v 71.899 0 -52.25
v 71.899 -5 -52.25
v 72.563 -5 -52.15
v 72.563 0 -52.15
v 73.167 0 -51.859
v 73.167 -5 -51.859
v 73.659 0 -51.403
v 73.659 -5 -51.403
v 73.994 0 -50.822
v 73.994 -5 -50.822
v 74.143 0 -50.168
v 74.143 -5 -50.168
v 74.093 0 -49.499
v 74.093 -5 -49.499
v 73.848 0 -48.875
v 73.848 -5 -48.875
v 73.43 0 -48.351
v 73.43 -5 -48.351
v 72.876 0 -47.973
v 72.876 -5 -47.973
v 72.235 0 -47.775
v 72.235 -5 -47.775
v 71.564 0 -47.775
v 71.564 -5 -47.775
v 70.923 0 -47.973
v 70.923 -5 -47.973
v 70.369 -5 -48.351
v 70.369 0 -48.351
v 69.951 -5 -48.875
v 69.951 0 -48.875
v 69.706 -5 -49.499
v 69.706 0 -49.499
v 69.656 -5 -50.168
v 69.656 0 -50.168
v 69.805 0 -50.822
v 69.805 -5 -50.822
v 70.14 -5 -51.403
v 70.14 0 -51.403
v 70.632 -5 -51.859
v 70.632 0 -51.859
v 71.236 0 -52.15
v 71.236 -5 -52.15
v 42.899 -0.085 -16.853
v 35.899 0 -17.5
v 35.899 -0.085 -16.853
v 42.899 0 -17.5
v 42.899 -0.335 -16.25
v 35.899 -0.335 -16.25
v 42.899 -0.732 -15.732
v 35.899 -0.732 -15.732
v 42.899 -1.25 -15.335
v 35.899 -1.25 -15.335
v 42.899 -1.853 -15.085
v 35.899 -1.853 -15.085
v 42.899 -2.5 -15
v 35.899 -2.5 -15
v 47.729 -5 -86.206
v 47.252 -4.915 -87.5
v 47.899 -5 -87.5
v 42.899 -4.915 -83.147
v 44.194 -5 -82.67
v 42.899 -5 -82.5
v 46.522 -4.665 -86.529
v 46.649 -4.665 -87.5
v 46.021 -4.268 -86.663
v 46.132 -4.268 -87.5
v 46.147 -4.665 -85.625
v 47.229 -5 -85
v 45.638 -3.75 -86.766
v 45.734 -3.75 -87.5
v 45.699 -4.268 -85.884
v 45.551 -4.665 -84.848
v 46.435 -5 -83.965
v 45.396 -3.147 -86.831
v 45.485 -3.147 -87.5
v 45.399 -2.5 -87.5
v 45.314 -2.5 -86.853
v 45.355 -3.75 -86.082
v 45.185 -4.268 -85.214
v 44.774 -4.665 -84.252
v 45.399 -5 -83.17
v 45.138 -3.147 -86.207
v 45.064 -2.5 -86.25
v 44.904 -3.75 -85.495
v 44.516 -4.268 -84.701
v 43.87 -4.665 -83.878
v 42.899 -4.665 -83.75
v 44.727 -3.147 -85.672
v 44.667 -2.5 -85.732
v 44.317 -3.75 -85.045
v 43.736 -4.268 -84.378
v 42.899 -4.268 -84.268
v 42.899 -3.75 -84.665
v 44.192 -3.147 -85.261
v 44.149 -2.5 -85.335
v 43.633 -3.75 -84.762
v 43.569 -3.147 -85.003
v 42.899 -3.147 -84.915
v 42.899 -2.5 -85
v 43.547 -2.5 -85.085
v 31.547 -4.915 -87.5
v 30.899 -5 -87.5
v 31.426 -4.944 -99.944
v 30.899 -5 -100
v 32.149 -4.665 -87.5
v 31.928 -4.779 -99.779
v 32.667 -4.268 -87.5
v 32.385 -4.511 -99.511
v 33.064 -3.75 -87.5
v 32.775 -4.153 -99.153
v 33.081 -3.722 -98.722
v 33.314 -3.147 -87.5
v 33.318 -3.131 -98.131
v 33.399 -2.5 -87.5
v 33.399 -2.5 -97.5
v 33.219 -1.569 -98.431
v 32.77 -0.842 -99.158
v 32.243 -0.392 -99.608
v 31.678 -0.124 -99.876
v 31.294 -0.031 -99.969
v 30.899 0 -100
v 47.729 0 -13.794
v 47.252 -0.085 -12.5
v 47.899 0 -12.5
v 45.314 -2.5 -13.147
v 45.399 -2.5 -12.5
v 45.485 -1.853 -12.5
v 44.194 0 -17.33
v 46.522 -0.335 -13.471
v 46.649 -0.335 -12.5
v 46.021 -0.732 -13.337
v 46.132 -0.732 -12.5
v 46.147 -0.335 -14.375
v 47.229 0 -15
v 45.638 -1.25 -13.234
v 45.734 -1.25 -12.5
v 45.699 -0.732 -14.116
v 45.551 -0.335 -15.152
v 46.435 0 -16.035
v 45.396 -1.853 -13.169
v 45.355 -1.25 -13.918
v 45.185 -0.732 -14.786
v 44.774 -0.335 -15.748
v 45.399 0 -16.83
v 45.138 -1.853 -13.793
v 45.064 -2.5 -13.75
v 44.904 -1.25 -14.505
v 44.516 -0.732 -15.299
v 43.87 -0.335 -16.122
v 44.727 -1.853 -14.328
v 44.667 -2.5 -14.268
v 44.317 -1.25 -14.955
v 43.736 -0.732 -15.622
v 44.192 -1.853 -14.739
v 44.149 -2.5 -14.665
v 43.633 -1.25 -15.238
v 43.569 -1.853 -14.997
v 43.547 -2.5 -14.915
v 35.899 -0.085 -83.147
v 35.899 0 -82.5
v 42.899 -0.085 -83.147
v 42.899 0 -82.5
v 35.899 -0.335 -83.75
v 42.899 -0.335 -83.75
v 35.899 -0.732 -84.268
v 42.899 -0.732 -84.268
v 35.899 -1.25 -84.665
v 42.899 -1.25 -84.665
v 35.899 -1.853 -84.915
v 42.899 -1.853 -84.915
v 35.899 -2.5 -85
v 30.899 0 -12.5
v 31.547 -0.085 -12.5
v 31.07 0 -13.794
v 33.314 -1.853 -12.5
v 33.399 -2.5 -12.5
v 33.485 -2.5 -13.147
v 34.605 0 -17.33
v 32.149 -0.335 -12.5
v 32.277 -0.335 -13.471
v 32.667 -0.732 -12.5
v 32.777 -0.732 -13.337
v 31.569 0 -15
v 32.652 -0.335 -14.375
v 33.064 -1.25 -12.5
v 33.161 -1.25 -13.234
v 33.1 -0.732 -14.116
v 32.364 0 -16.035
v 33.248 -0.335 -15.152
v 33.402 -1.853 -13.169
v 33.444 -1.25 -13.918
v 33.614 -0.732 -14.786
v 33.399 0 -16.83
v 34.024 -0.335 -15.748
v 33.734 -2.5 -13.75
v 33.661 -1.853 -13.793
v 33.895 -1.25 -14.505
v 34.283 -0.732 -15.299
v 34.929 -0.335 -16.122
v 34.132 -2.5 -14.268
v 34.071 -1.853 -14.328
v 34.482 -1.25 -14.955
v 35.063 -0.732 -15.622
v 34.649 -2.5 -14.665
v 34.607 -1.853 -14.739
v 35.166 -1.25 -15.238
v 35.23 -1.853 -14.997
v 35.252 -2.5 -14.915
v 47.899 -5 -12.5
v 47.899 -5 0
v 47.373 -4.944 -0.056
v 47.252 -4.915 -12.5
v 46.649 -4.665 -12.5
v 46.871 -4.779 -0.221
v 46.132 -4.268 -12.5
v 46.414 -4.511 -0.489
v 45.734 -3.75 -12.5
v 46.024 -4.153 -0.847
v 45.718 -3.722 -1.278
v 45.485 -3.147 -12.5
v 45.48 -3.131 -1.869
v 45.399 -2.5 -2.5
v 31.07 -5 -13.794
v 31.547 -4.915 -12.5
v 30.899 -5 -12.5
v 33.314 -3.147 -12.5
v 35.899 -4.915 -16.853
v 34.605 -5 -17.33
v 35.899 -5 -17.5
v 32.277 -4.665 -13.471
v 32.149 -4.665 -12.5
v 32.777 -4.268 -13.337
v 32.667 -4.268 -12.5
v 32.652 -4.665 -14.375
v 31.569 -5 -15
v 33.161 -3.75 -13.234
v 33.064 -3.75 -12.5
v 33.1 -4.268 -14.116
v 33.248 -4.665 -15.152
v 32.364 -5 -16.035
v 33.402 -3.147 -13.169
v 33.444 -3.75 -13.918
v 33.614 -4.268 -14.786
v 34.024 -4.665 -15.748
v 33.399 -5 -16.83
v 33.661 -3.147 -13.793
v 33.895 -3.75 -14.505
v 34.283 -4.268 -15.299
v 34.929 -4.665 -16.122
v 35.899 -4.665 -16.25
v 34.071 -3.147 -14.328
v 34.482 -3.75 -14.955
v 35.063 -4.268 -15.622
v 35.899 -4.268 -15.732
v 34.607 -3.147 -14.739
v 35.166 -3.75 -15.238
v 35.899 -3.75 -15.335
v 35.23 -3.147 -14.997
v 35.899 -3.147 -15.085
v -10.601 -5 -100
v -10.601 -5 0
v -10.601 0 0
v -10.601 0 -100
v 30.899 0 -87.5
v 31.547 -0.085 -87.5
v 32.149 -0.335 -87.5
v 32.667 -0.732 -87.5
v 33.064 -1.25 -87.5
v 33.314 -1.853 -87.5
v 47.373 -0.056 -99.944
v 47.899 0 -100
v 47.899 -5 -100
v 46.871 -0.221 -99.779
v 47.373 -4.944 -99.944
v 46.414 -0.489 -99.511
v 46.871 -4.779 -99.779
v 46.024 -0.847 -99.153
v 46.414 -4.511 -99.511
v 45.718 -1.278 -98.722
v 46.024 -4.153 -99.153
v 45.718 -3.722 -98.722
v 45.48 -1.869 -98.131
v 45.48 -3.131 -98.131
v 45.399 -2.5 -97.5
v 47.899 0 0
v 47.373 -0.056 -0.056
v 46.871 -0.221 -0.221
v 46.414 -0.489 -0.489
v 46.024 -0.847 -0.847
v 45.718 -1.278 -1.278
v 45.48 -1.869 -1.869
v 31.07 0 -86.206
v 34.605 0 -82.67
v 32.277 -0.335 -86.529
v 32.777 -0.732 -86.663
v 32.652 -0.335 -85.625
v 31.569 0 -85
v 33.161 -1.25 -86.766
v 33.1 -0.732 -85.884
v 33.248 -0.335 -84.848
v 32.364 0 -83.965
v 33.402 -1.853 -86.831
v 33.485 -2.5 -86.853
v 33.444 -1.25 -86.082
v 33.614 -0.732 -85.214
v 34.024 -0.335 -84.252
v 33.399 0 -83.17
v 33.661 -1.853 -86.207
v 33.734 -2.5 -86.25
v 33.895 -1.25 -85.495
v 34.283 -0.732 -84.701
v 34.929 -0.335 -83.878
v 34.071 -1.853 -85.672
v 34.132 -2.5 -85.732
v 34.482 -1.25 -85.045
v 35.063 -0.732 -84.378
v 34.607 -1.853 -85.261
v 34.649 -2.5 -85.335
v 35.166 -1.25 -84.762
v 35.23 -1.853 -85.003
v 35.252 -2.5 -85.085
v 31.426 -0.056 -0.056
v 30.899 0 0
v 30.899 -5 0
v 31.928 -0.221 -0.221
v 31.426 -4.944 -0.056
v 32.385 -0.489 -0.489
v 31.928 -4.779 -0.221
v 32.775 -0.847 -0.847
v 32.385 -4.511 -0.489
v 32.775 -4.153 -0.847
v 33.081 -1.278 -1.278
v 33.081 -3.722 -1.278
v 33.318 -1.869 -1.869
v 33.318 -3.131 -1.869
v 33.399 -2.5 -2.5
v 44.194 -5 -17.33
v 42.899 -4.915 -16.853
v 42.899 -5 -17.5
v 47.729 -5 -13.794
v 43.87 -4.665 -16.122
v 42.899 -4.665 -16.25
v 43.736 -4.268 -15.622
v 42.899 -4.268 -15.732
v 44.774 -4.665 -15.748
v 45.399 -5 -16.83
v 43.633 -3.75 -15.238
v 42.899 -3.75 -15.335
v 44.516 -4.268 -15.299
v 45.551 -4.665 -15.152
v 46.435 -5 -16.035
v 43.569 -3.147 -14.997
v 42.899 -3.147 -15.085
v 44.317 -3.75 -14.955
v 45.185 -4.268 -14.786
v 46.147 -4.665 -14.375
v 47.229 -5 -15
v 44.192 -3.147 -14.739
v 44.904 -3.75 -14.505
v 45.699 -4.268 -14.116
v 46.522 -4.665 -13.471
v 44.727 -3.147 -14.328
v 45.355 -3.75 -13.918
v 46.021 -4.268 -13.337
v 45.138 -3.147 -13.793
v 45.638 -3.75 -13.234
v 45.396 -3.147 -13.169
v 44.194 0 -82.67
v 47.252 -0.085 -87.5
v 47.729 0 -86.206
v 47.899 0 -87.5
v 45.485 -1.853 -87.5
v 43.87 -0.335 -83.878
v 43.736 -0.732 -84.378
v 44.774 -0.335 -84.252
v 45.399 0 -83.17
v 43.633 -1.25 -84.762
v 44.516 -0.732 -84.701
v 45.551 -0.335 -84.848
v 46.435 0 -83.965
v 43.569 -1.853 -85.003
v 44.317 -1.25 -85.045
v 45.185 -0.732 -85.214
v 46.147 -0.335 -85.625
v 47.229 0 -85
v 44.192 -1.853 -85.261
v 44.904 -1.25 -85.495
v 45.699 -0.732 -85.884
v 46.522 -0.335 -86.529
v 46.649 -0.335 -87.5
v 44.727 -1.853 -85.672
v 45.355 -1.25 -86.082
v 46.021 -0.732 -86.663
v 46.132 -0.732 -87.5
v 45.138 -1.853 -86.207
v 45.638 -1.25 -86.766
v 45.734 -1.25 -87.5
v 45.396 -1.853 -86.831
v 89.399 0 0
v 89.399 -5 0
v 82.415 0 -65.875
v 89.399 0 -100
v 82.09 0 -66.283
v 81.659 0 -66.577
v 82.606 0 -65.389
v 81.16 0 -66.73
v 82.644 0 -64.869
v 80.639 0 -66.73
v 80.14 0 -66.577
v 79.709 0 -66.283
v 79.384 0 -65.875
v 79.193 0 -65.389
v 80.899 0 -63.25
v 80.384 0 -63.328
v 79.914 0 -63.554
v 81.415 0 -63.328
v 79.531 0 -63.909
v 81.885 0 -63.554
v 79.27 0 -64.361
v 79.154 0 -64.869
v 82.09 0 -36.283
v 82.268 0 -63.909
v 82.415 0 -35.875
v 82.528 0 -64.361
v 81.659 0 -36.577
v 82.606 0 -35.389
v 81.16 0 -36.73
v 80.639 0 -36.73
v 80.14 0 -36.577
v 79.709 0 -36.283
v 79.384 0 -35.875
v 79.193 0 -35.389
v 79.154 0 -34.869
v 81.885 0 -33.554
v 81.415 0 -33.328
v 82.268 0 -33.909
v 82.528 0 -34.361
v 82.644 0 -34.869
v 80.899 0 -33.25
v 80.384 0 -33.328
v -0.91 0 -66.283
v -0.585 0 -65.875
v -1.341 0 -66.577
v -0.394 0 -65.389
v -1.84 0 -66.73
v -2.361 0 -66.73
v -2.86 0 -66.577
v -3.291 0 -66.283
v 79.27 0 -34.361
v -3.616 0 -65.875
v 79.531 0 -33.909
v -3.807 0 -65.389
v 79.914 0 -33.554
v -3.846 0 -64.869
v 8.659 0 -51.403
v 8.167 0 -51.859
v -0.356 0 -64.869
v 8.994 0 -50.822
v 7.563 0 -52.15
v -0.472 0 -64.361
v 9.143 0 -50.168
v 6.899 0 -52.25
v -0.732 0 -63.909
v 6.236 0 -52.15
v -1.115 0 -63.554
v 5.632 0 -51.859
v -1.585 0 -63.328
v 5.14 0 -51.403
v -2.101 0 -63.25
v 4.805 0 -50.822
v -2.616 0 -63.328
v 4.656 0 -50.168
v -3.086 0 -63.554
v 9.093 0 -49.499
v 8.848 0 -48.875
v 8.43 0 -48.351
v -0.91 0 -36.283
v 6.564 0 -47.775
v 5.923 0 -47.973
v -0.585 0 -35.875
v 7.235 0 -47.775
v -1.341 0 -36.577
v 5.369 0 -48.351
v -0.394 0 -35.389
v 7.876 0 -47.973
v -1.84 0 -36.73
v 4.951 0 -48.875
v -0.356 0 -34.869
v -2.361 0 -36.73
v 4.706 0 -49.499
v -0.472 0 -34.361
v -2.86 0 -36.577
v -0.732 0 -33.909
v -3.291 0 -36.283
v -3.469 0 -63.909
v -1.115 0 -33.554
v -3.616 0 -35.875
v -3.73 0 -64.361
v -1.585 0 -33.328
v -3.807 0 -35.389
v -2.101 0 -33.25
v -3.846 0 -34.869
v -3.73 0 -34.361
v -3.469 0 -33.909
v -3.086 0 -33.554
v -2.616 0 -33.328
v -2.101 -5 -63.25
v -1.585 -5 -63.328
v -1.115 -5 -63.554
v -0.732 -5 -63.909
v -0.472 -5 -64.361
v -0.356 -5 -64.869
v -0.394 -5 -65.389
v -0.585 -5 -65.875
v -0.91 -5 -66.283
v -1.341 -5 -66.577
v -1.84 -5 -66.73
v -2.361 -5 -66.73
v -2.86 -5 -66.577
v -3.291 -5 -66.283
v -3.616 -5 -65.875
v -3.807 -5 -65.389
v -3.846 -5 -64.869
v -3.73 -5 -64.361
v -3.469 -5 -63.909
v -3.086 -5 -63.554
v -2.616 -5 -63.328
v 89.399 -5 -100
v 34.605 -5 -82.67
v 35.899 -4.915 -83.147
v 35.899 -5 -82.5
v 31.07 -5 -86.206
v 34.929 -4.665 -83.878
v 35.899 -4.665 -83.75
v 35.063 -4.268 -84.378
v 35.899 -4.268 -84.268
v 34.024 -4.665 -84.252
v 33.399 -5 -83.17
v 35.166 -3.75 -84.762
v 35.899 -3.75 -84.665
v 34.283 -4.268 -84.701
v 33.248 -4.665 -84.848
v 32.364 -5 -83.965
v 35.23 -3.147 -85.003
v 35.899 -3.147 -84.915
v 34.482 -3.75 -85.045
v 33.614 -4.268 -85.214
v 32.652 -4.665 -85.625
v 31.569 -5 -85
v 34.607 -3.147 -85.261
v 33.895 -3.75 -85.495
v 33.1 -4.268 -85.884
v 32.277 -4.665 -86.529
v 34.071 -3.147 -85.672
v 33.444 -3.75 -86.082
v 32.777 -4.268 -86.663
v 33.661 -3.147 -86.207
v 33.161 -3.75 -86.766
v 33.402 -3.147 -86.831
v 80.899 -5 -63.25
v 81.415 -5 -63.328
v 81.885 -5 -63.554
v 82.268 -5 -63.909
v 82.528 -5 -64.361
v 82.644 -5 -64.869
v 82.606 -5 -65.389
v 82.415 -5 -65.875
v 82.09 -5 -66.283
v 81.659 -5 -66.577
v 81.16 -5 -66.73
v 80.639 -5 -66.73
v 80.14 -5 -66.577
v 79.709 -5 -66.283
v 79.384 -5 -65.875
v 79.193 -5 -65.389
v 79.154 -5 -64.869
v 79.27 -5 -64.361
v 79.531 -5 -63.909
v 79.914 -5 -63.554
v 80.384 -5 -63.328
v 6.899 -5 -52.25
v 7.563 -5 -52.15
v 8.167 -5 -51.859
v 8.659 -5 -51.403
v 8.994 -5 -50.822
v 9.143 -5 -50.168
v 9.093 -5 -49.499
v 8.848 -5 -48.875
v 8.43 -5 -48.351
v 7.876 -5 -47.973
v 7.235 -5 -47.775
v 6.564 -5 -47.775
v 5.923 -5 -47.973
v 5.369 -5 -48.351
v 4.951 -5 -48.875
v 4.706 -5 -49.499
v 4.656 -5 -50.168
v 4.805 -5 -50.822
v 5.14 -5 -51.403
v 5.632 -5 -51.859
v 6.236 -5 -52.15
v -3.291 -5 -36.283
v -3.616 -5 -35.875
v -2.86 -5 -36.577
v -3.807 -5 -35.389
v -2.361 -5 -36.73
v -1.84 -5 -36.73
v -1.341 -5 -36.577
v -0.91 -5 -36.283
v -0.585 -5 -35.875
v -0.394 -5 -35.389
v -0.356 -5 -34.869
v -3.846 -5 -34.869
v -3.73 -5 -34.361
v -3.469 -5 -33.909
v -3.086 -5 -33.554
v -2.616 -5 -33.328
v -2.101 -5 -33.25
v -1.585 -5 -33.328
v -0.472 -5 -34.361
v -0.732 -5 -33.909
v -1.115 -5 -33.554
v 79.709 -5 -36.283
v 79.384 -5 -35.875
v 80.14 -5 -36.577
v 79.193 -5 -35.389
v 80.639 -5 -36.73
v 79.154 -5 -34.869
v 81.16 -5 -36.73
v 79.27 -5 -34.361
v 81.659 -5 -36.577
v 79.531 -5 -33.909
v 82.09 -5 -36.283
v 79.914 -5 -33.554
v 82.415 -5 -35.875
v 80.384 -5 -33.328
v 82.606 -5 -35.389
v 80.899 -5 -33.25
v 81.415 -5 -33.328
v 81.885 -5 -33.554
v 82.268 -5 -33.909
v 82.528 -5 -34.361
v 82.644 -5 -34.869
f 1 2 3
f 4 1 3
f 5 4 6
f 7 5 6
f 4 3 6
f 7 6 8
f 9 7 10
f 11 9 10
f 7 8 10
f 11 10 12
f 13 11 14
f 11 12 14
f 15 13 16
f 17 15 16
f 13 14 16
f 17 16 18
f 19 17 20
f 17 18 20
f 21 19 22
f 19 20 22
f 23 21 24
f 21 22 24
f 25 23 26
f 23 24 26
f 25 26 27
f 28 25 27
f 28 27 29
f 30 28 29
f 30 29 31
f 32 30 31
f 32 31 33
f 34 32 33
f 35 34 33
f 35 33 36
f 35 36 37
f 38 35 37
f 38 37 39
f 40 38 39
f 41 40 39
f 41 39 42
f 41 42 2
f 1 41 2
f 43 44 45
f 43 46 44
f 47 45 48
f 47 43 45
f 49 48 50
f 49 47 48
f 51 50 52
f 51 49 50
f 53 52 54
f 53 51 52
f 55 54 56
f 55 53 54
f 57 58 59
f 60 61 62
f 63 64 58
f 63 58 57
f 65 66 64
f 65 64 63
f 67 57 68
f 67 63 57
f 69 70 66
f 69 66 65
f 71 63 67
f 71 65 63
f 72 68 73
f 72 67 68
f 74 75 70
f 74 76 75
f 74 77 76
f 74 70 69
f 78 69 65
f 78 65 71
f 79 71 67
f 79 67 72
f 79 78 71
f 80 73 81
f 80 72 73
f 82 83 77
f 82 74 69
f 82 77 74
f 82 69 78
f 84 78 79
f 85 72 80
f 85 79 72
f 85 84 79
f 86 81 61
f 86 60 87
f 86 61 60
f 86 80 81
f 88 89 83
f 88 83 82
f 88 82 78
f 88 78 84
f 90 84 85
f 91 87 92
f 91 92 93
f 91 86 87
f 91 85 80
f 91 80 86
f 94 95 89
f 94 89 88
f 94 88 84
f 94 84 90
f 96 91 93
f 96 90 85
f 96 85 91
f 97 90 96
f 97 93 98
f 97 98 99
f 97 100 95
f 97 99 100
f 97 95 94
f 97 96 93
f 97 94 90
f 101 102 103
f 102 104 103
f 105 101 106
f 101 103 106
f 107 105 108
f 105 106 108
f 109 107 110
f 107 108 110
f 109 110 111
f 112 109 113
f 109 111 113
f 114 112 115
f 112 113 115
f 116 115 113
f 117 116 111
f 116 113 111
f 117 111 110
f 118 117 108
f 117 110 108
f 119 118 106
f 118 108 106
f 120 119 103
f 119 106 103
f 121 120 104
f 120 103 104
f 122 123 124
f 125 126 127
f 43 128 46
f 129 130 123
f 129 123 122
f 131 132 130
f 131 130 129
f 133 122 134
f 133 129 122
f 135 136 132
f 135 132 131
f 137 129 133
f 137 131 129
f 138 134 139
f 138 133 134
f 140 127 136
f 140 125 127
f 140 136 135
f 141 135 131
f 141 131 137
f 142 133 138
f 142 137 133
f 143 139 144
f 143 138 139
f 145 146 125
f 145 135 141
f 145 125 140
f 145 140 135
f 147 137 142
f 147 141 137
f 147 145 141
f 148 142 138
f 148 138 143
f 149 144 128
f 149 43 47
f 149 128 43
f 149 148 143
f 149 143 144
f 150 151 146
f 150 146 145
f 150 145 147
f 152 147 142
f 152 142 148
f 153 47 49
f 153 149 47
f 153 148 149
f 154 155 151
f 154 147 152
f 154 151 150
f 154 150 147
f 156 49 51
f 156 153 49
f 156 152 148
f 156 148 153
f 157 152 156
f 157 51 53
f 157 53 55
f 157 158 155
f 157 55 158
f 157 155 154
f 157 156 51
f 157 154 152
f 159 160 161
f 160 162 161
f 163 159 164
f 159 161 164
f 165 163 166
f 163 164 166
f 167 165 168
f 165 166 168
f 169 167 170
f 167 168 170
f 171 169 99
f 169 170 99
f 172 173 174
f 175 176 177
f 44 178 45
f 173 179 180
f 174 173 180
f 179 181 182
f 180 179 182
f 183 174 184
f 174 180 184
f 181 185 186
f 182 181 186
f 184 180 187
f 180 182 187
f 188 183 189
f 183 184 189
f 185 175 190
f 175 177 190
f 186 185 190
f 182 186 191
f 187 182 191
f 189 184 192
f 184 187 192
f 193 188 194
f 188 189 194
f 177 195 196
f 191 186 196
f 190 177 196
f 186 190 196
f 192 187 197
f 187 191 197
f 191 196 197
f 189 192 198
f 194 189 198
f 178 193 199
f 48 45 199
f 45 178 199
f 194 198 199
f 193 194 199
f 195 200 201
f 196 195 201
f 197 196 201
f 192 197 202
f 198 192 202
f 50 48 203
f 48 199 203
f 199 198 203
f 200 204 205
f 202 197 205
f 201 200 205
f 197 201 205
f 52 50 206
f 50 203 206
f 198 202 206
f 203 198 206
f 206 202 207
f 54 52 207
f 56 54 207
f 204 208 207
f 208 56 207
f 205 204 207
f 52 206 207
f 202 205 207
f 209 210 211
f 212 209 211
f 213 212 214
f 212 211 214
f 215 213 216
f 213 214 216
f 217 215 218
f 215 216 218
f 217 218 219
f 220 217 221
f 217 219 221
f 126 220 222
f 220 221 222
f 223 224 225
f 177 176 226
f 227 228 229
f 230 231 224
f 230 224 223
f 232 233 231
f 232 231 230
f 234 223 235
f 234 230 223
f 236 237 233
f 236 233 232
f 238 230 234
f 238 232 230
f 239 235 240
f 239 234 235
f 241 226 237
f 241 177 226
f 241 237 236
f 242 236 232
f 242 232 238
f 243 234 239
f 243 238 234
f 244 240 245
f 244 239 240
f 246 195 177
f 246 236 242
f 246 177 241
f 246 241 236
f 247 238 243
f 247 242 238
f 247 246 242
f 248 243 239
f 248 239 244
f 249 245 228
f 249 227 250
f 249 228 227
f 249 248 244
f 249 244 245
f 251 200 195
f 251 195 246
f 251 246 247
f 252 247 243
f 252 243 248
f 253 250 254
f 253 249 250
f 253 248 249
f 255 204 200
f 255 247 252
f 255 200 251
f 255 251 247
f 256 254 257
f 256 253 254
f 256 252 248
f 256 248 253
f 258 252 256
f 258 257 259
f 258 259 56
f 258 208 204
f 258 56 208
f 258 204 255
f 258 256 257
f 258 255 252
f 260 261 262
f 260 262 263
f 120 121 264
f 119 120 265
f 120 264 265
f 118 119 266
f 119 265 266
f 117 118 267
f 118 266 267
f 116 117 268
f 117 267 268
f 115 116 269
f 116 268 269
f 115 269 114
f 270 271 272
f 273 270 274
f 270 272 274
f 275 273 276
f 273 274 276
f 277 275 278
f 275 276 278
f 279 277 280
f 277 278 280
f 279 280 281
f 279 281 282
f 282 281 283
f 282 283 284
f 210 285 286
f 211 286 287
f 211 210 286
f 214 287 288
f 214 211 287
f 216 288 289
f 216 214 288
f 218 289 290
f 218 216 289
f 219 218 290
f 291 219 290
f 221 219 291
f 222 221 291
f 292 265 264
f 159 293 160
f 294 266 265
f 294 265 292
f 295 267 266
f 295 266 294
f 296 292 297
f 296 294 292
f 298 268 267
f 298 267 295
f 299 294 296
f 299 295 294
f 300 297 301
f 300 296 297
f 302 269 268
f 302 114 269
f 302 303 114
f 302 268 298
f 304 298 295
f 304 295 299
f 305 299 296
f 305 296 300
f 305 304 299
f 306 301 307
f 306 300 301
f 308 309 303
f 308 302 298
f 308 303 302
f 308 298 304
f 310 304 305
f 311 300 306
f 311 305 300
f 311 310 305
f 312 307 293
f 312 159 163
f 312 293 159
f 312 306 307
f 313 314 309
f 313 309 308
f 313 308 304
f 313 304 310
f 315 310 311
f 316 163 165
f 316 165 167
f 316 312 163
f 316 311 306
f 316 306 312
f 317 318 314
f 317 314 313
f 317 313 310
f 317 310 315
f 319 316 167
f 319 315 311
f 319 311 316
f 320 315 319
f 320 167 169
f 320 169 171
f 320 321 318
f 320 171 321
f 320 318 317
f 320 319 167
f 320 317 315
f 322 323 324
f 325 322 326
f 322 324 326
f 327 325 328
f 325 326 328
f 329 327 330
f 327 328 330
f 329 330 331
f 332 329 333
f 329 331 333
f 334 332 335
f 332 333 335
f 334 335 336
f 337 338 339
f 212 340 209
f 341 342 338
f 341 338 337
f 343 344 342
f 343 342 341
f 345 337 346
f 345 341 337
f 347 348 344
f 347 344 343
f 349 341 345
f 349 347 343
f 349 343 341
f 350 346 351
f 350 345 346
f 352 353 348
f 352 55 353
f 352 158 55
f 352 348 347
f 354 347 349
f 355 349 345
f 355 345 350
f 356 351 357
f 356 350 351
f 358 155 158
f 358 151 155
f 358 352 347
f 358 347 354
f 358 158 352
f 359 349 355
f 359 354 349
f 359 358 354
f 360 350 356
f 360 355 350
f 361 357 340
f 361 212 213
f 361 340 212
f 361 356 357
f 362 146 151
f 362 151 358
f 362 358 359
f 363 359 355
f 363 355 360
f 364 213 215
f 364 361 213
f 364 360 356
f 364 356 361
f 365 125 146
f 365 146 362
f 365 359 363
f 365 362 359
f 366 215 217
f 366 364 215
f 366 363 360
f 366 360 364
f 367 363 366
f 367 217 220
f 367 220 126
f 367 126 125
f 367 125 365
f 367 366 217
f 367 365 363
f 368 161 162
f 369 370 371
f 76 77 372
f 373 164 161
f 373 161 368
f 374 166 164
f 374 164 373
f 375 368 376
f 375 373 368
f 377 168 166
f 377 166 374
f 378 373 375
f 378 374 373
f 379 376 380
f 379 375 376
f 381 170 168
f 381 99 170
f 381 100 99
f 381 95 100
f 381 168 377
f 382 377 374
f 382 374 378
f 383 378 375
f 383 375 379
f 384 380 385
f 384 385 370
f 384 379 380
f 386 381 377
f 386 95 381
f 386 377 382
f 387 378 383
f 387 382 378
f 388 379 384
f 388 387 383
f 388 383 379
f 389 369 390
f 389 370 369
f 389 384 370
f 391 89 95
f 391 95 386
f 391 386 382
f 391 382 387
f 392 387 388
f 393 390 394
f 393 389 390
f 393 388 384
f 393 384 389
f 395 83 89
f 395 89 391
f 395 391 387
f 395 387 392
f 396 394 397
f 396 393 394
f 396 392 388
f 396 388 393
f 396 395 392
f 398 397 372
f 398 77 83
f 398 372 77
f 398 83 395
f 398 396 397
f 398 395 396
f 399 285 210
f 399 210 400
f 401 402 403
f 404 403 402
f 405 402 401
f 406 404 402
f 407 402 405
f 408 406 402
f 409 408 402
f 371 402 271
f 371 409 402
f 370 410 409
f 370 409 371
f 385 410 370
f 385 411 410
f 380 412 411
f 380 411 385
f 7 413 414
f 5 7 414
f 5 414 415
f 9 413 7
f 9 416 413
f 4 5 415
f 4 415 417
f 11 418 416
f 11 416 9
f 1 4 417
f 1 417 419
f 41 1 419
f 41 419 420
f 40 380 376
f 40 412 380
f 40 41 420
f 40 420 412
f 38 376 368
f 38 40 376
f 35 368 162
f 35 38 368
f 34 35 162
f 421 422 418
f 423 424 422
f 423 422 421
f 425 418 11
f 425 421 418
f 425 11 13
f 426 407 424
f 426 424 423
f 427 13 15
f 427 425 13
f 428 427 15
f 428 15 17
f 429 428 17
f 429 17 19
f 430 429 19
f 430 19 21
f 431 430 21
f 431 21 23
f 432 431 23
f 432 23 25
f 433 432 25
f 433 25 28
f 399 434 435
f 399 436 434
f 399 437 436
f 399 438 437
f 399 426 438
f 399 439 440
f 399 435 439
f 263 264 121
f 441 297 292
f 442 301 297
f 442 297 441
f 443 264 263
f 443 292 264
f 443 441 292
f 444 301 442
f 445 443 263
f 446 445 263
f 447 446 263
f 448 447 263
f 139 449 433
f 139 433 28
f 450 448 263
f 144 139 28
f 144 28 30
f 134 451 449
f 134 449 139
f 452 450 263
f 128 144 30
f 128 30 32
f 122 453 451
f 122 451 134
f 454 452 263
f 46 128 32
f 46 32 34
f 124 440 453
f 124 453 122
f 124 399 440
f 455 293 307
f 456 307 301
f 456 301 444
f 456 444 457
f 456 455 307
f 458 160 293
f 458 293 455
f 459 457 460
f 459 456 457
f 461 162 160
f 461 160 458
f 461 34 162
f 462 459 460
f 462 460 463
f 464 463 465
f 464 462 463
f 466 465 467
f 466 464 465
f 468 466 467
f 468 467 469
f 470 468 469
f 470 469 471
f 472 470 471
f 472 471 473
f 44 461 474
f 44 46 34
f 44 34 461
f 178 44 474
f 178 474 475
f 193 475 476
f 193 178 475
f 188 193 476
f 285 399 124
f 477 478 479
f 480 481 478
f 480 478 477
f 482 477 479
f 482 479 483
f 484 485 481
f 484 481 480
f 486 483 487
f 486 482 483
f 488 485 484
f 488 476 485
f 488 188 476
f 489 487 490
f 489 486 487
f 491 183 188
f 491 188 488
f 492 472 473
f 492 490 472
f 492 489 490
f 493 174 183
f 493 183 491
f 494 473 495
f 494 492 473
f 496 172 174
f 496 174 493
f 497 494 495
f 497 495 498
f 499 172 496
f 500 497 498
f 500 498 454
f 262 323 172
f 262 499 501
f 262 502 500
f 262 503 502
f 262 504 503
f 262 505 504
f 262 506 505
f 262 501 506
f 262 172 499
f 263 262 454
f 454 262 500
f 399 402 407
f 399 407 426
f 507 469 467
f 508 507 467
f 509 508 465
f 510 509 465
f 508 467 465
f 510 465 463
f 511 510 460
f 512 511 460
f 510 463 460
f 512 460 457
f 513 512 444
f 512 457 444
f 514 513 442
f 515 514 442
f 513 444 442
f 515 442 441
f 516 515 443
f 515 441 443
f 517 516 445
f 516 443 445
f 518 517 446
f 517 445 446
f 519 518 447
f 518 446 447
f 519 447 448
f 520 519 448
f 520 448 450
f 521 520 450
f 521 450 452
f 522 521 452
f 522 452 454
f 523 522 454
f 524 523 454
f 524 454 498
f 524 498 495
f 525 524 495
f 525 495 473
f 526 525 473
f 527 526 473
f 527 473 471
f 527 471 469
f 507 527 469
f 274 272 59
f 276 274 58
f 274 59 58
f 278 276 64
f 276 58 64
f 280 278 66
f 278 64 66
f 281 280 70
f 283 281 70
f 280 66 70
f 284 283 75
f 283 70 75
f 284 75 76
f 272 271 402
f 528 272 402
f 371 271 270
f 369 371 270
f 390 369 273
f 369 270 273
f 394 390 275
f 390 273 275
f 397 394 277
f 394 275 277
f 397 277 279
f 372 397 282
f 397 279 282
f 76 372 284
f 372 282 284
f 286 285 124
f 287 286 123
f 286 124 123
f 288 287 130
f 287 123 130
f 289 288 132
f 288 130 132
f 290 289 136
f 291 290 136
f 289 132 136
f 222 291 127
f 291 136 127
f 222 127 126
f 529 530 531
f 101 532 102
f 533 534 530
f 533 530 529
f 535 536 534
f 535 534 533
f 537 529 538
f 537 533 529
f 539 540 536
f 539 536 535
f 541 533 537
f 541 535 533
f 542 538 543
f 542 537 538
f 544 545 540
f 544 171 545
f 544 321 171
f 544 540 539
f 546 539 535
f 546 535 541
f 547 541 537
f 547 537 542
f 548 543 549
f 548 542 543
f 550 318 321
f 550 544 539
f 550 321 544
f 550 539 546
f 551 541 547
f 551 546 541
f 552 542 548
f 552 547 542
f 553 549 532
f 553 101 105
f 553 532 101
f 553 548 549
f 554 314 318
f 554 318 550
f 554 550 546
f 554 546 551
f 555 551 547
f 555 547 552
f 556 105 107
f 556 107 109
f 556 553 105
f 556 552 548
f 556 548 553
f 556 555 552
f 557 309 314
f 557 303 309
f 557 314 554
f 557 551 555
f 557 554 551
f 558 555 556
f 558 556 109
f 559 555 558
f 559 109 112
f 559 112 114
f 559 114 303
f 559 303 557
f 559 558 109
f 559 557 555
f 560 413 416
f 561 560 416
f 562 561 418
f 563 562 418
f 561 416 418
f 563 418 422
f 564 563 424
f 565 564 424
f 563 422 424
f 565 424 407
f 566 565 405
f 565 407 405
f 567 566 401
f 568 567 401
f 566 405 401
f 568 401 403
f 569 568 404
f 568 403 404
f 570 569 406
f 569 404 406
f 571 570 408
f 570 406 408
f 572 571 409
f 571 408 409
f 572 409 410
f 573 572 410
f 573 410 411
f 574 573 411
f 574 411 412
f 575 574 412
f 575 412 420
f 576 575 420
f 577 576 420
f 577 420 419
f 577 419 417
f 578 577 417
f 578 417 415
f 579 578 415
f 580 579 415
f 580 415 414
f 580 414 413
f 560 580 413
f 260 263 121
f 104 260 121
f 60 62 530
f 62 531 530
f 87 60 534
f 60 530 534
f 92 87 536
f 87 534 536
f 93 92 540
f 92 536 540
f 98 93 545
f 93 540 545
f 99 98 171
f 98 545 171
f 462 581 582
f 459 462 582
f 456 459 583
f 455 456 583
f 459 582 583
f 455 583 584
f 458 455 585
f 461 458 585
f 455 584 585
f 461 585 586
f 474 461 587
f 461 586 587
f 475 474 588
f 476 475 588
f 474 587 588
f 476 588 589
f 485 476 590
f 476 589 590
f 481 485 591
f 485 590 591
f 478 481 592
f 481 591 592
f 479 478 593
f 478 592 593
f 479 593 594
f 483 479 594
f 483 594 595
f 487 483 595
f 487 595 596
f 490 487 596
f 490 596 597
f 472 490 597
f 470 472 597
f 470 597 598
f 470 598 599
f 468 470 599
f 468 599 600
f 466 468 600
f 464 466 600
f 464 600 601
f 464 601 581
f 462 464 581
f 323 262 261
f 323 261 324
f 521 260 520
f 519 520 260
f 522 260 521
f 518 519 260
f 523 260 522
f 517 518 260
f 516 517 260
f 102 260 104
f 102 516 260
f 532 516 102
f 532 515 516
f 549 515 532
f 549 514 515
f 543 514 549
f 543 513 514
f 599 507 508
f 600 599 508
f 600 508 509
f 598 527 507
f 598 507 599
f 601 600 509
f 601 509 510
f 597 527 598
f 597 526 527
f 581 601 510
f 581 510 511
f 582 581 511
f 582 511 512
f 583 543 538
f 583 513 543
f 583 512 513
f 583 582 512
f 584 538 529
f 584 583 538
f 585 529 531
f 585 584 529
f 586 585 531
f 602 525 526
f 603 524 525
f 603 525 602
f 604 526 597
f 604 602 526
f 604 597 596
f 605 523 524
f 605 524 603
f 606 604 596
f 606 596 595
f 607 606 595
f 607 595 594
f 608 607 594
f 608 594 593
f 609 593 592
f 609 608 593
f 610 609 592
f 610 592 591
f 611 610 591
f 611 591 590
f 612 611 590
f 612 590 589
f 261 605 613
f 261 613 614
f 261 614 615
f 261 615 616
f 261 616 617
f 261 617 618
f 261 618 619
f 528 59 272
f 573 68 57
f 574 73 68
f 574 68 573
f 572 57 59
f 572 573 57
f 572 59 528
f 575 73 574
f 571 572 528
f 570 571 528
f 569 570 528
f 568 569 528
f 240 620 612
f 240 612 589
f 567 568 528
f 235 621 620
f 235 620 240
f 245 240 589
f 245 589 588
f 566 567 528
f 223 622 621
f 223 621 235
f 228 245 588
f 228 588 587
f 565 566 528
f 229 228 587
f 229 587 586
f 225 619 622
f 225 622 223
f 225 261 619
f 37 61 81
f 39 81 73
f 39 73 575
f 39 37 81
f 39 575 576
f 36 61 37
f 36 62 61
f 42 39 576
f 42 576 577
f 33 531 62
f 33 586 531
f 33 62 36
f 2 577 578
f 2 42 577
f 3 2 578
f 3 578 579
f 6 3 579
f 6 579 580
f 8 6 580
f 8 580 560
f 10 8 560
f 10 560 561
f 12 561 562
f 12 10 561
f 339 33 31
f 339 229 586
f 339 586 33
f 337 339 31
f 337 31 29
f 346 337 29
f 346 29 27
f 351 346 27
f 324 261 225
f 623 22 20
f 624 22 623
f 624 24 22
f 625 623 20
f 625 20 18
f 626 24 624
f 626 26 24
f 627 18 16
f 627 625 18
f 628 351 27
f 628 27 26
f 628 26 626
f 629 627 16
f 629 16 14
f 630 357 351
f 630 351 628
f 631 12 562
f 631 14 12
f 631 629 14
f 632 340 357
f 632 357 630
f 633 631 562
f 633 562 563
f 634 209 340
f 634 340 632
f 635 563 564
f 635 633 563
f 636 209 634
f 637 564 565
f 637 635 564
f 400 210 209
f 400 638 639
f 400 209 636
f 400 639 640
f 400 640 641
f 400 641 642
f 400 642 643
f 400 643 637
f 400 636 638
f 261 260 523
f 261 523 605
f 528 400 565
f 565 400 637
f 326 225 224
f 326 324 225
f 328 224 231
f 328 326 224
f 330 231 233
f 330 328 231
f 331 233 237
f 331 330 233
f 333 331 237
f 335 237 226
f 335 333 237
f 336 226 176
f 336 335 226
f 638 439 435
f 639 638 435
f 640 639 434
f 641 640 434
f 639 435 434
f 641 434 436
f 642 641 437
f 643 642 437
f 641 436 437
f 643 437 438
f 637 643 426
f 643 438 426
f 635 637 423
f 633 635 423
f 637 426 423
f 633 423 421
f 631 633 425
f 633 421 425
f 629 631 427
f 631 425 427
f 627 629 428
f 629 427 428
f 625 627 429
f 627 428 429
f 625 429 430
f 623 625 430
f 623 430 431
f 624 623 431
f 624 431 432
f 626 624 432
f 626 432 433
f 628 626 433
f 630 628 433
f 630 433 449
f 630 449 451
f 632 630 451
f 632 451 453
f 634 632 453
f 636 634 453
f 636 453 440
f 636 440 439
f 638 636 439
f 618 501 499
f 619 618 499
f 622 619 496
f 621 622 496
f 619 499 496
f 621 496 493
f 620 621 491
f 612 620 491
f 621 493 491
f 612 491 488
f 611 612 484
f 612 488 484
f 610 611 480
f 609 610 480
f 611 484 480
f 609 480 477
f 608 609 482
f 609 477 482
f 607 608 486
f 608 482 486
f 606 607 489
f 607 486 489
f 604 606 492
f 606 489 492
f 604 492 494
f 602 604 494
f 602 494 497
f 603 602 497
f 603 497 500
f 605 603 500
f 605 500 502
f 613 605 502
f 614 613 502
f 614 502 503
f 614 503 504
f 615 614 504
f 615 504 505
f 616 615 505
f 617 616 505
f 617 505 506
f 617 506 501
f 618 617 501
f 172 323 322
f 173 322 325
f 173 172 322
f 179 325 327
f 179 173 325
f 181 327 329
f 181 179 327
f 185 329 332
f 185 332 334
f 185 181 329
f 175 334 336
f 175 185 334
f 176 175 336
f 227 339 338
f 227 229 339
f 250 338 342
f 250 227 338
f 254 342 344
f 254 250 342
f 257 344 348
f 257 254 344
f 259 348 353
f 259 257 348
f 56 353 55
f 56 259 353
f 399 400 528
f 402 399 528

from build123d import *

# Parameters (mm, degrees)
BOSS_EXTRUDE1_DEPTH            = 100
CUT_EXTRUDE3_DEPTH             = 202.556443707
CUT_EXTRUDE3_DEPTH_BACK        = 202.556443707
SKETCH4_4_R                    = 9.85
CUT_EXTRUDE4_DEPTH             = 3
CUT_EXTRUDE5_START             = 103
SKETCH4_6_R                    = 9.85
CUT_EXTRUDE5_DEPTH             = 103
CUT_EXTRUDE6_REACH             = 206.206
SKETCH5_R                      = 2.25
CUT_EXTRUDE6_DIRECTION_2_DEPTH = 205.205778567
CUT_EXTRUDE7_REACH             = 201.841
SKETCH6_R                      = 2.25
SKETCH7_W                      = 12
SKETCH7_H                      = 15
CUT_EXTRUDE8_DEPTH             = 197.242821038
FILLET3_R                      = 2.5
FILLET4_R                      = 2.5
FILLET6_R                      = 5
CUT_EXTRUDE9_DEPTH             = 197.242821038
CUT_EXTRUDE9_DEPTH_BACK        = 197.242821038
SKETCH8_W                      = 5
SKETCH8_H                      = 100
CUT_EXTRUDE10_REACH            = 136.228
SKETCH11_R                     = 1.75


with BuildPart() as part:
    # Sketch1 → Boss-Extrude1 (new body)
    with BuildSketch(Plane.XY):
        Polygon((-10.600610125, 140), (-15.600610125, 140), (-15.600610125, -5), (94.399389875, -5), (94.399389875, 140), (89.399389875, 140), (89.399389875, 0), (-10.600610125, 0), align=None)
    extrude(amount=-BOSS_EXTRUDE1_DEPTH)

    # Sketch4 → Cut-Extrude3 (cut, two sides: drawn at the far end of the back side and taken through both)
    with BuildSketch(Plane.ZY.offset(-89.399389875).offset(-CUT_EXTRUDE3_DEPTH_BACK)):
        with BuildLine():
            ThreePointArc((-89.05, 45), (-82.05, 38), (-75.05, 45))
            Line((-75.05, 45), (-82.05, 45))
            Line((-82.05, 45), (-89.05, 45))
        make_face()
        with BuildLine():
            Line((-82.05, 45), (-75.05, 45))
            ThreePointArc((-75.05, 45), (-82.05, 52), (-89.05, 45))
            Line((-89.05, 45), (-82.05, 45))
        make_face()
        with BuildLine():
            ThreePointArc((-57, 45), (-50, 38), (-43, 45))
            Line((-43, 45), (-50, 45))
            Line((-50, 45), (-57, 45))
        make_face()
        with BuildLine():
            Line((-50, 45), (-43, 45))
            ThreePointArc((-43, 45), (-50, 52), (-57, 45))
            Line((-57, 45), (-50, 45))
        make_face()
        with BuildLine():
            ThreePointArc((-24.95, 45), (-17.95, 38), (-10.95, 45))
            Line((-10.95, 45), (-17.95, 45))
            Line((-17.95, 45), (-24.95, 45))
        make_face()
        with BuildLine():
            Line((-17.95, 45), (-10.95, 45))
            ThreePointArc((-10.95, 45), (-17.95, 52), (-24.95, 45))
            Line((-24.95, 45), (-17.95, 45))
        make_face()
    extrude(amount=CUT_EXTRUDE3_DEPTH + CUT_EXTRUDE3_DEPTH_BACK, mode=Mode.SUBTRACT)

    # Sketch4<4> → Cut-Extrude4 (cut)
    with BuildSketch(Plane.ZY.offset(-89.399389875)):
        with Locations((-50, 45)):
            Circle(SKETCH4_4_R)
        with Locations((-82.05, 45)):
            Circle(SKETCH4_4_R)
        with Locations((-17.95, 45)):
            Circle(SKETCH4_4_R)
    extrude(amount=-CUT_EXTRUDE4_DEPTH, mode=Mode.SUBTRACT)

    # Sketch4<6> → Cut-Extrude5 (cut)
    with BuildSketch(Plane.ZY.offset(-89.399389875).offset(CUT_EXTRUDE5_START)):
        with Locations((-50, 45)):
            Circle(SKETCH4_6_R)
        with Locations((-82.05, 45)):
            Circle(SKETCH4_6_R)
        with Locations((-17.95, 45)):
            Circle(SKETCH4_6_R)
    extrude(amount=-CUT_EXTRUDE5_DEPTH, mode=Mode.SUBTRACT)

    # Sketch5 → Cut-Extrude6 (cut, up to next)
    with BuildSketch(Plane.ZY.offset(15.600610125), mode=Mode.PRIVATE) as cut_extrude6_sk1:
        with Locations(Location((-78.75, 119.5, 0), (0, 0, 90))):
            Circle(SKETCH5_R)
    cut_extrude6_tool1 = extrude(cut_extrude6_sk1.sketch, amount=-CUT_EXTRUDE6_REACH, mode=Mode.PRIVATE) & part.part
    # Sketch5 → Cut-Extrude6 (cut, up to next)
    with BuildSketch(Plane.ZY.offset(15.600610125), mode=Mode.PRIVATE) as cut_extrude6_sk2:
        with Locations(Location((-21.25, 119.5, 0), (0, 0, 90))):
            Circle(SKETCH5_R)
    cut_extrude6_tool2 = extrude(cut_extrude6_sk2.sketch, amount=-CUT_EXTRUDE6_REACH, mode=Mode.PRIVATE) & part.part
    add(cut_extrude6_tool1.solids().sort_by_distance((-15.60061, 119.5, -78.75))[0], mode=Mode.SUBTRACT)
    add(cut_extrude6_tool2.solids().sort_by_distance((-15.60061, 119.5, -21.25))[0], mode=Mode.SUBTRACT)

    # Sketch5 → Cut-Extrude6 direction 2 (cut)
    with BuildSketch(Plane.ZY.offset(15.600610125)):
        with Locations(Location((-78.75, 119.5, 0), (0, 0, 90))):
            Circle(SKETCH5_R)
        with Locations(Location((-21.25, 119.5, 0), (0, 0, 90))):
            Circle(SKETCH5_R)
    extrude(amount=CUT_EXTRUDE6_DIRECTION_2_DEPTH, mode=Mode.SUBTRACT)

    # Sketch6 → Cut-Extrude7 (cut, up to next)
    with BuildSketch(Plane.XZ.offset(5), mode=Mode.PRIVATE) as cut_extrude7_sk1:
        with Locations(Location((71.899389875, -50, 0), (0, 0, 270))):
            Circle(SKETCH6_R)
    cut_extrude7_tool1 = extrude(cut_extrude7_sk1.sketch, amount=-CUT_EXTRUDE7_REACH, mode=Mode.PRIVATE) & part.part
    # Sketch6 → Cut-Extrude7 (cut, up to next)
    with BuildSketch(Plane.XZ.offset(5), mode=Mode.PRIVATE) as cut_extrude7_sk2:
        with Locations(Location((6.899389875, -50, 0), (0, 0, 270))):
            Circle(SKETCH6_R)
    cut_extrude7_tool2 = extrude(cut_extrude7_sk2.sketch, amount=-CUT_EXTRUDE7_REACH, mode=Mode.PRIVATE) & part.part
    add(cut_extrude7_tool1.solids().sort_by_distance((71.89939, -5, -50))[0], mode=Mode.SUBTRACT)
    add(cut_extrude7_tool2.solids().sort_by_distance((6.89939, -5, -50))[0], mode=Mode.SUBTRACT)

    # Sketch7 → Cut-Extrude8 (cut, through all)
    with BuildSketch(Plane(origin=(0, 0, 0), x_dir=(1, 0, 0), z_dir=(0, 1, 0))):
        Polygon((45.399389875, 100), (39.399389875, 100), (33.399389875, 100), (33.399389875, 85), (45.399389875, 85), align=None)
        with Locations((39.399389875, 7.5)):
            Rectangle(SKETCH7_W, SKETCH7_H)
    extrude(amount=-CUT_EXTRUDE8_DEPTH, mode=Mode.SUBTRACT)

    # Fillet3
    fillet3_edges = [part.edges().sort_by_distance(p)[0] for p in [
        (33.399389875, 0, -7.5),
        (33.399389875, -2.5, 0),
        (39.399389875, 0, -15),
        (33.399389875, -2.5, -15),
        (45.399389875, -5, -7.5),
        (45.399389875, -2.5, -15),
        (45.399389875, -2.5, 0),
        (33.399389875, -5, -7.5),
        (39.399389875, -5, -15),
        (45.399389875, 0, -7.5),
    ]]
    fillet(fillet3_edges, radius=FILLET3_R - 0.0001)  # a hair under: the kernel refuses the full size

    # Fillet4
    fillet4_edges = [part.edges().sort_by_distance(p)[0] for p in [
        (45.399389875, 0, -92.5),
        (45.399389875, -2.5, -100),
        (39.399389875, -5, -85),
        (45.399389875, -2.5, -85),
        (33.399389875, -5, -92.5),
        (33.399389875, -2.5, -85),
        (33.399389875, -2.5, -100),
        (45.399389875, -5, -92.5),
        (33.399389875, 0, -92.5),
        (39.399389875, 0, -85),
    ]]
    fillet(fillet4_edges, radius=FILLET4_R - 0.0001)  # a hair under: the kernel refuses the full size

    # Fillet6
    fillet6_edges = [part.edges().sort_by_distance(p)[0] for p in [
        (91.899389875, 140, -100),
        (-13.100610125, 140, -100),
        (-13.100610125, 140, 0),
        (91.899389875, 140, 0),
    ]]
    fillet(fillet6_edges, radius=FILLET6_R)

    # Sketch8 → Cut-Extrude9 (cut, two sides: drawn at the far end of the back side and taken through both)
    with BuildSketch(Plane(origin=(0, 0, 0), x_dir=(1, 0, 0), z_dir=(0, 1, 0)).offset(-CUT_EXTRUDE9_DEPTH_BACK)):
        with Locations((-13.100610125, 50)):
            Rectangle(SKETCH8_W, SKETCH8_H)
        with Locations((91.899389875, 50)):
            Rectangle(SKETCH8_W, SKETCH8_H)
    extrude(amount=CUT_EXTRUDE9_DEPTH + CUT_EXTRUDE9_DEPTH_BACK, mode=Mode.SUBTRACT)

    # Sketch11 → Cut-Extrude10 (cut, up to next)
    with BuildSketch(Plane(origin=(0, 0, 0), x_dir=(1, 0, 0), z_dir=(0, 1, 0)), mode=Mode.PRIVATE) as cut_extrude10_sk1:
        with Locations(Location((80.899389875, 65, 0), (0, 0, 270))):
            Circle(SKETCH11_R)
    cut_extrude10_tool1 = extrude(cut_extrude10_sk1.sketch, amount=-CUT_EXTRUDE10_REACH, mode=Mode.PRIVATE) & part.part
    # Sketch11 → Cut-Extrude10 (cut, up to next)
    with BuildSketch(Plane(origin=(0, 0, 0), x_dir=(1, 0, 0), z_dir=(0, 1, 0)), mode=Mode.PRIVATE) as cut_extrude10_sk2:
        with Locations(Location((80.899389875, 35, 0), (0, 0, 270))):
            Circle(SKETCH11_R)
    cut_extrude10_tool2 = extrude(cut_extrude10_sk2.sketch, amount=-CUT_EXTRUDE10_REACH, mode=Mode.PRIVATE) & part.part
    # Sketch11 → Cut-Extrude10 (cut, up to next)
    with BuildSketch(Plane(origin=(0, 0, 0), x_dir=(1, 0, 0), z_dir=(0, 1, 0)), mode=Mode.PRIVATE) as cut_extrude10_sk3:
        with Locations(Location((-2.100610125, 35, 0), (0, 0, 270))):
            Circle(SKETCH11_R)
    cut_extrude10_tool3 = extrude(cut_extrude10_sk3.sketch, amount=-CUT_EXTRUDE10_REACH, mode=Mode.PRIVATE) & part.part
    # Sketch11 → Cut-Extrude10 (cut, up to next)
    with BuildSketch(Plane(origin=(0, 0, 0), x_dir=(1, 0, 0), z_dir=(0, 1, 0)), mode=Mode.PRIVATE) as cut_extrude10_sk4:
        with Locations(Location((-2.100610125, 65, 0), (0, 0, 270))):
            Circle(SKETCH11_R)
    cut_extrude10_tool4 = extrude(cut_extrude10_sk4.sketch, amount=-CUT_EXTRUDE10_REACH, mode=Mode.PRIVATE) & part.part
    add(cut_extrude10_tool1.solids().sort_by_distance((80.89939, 0, -65))[0], mode=Mode.SUBTRACT)
    add(cut_extrude10_tool2.solids().sort_by_distance((80.89939, 0, -35))[0], mode=Mode.SUBTRACT)
    add(cut_extrude10_tool3.solids().sort_by_distance((-2.10061, 0, -35))[0], mode=Mode.SUBTRACT)
    add(cut_extrude10_tool4.solids().sort_by_distance((-2.10061, 0, -65))[0], mode=Mode.SUBTRACT)


solid = part.part
